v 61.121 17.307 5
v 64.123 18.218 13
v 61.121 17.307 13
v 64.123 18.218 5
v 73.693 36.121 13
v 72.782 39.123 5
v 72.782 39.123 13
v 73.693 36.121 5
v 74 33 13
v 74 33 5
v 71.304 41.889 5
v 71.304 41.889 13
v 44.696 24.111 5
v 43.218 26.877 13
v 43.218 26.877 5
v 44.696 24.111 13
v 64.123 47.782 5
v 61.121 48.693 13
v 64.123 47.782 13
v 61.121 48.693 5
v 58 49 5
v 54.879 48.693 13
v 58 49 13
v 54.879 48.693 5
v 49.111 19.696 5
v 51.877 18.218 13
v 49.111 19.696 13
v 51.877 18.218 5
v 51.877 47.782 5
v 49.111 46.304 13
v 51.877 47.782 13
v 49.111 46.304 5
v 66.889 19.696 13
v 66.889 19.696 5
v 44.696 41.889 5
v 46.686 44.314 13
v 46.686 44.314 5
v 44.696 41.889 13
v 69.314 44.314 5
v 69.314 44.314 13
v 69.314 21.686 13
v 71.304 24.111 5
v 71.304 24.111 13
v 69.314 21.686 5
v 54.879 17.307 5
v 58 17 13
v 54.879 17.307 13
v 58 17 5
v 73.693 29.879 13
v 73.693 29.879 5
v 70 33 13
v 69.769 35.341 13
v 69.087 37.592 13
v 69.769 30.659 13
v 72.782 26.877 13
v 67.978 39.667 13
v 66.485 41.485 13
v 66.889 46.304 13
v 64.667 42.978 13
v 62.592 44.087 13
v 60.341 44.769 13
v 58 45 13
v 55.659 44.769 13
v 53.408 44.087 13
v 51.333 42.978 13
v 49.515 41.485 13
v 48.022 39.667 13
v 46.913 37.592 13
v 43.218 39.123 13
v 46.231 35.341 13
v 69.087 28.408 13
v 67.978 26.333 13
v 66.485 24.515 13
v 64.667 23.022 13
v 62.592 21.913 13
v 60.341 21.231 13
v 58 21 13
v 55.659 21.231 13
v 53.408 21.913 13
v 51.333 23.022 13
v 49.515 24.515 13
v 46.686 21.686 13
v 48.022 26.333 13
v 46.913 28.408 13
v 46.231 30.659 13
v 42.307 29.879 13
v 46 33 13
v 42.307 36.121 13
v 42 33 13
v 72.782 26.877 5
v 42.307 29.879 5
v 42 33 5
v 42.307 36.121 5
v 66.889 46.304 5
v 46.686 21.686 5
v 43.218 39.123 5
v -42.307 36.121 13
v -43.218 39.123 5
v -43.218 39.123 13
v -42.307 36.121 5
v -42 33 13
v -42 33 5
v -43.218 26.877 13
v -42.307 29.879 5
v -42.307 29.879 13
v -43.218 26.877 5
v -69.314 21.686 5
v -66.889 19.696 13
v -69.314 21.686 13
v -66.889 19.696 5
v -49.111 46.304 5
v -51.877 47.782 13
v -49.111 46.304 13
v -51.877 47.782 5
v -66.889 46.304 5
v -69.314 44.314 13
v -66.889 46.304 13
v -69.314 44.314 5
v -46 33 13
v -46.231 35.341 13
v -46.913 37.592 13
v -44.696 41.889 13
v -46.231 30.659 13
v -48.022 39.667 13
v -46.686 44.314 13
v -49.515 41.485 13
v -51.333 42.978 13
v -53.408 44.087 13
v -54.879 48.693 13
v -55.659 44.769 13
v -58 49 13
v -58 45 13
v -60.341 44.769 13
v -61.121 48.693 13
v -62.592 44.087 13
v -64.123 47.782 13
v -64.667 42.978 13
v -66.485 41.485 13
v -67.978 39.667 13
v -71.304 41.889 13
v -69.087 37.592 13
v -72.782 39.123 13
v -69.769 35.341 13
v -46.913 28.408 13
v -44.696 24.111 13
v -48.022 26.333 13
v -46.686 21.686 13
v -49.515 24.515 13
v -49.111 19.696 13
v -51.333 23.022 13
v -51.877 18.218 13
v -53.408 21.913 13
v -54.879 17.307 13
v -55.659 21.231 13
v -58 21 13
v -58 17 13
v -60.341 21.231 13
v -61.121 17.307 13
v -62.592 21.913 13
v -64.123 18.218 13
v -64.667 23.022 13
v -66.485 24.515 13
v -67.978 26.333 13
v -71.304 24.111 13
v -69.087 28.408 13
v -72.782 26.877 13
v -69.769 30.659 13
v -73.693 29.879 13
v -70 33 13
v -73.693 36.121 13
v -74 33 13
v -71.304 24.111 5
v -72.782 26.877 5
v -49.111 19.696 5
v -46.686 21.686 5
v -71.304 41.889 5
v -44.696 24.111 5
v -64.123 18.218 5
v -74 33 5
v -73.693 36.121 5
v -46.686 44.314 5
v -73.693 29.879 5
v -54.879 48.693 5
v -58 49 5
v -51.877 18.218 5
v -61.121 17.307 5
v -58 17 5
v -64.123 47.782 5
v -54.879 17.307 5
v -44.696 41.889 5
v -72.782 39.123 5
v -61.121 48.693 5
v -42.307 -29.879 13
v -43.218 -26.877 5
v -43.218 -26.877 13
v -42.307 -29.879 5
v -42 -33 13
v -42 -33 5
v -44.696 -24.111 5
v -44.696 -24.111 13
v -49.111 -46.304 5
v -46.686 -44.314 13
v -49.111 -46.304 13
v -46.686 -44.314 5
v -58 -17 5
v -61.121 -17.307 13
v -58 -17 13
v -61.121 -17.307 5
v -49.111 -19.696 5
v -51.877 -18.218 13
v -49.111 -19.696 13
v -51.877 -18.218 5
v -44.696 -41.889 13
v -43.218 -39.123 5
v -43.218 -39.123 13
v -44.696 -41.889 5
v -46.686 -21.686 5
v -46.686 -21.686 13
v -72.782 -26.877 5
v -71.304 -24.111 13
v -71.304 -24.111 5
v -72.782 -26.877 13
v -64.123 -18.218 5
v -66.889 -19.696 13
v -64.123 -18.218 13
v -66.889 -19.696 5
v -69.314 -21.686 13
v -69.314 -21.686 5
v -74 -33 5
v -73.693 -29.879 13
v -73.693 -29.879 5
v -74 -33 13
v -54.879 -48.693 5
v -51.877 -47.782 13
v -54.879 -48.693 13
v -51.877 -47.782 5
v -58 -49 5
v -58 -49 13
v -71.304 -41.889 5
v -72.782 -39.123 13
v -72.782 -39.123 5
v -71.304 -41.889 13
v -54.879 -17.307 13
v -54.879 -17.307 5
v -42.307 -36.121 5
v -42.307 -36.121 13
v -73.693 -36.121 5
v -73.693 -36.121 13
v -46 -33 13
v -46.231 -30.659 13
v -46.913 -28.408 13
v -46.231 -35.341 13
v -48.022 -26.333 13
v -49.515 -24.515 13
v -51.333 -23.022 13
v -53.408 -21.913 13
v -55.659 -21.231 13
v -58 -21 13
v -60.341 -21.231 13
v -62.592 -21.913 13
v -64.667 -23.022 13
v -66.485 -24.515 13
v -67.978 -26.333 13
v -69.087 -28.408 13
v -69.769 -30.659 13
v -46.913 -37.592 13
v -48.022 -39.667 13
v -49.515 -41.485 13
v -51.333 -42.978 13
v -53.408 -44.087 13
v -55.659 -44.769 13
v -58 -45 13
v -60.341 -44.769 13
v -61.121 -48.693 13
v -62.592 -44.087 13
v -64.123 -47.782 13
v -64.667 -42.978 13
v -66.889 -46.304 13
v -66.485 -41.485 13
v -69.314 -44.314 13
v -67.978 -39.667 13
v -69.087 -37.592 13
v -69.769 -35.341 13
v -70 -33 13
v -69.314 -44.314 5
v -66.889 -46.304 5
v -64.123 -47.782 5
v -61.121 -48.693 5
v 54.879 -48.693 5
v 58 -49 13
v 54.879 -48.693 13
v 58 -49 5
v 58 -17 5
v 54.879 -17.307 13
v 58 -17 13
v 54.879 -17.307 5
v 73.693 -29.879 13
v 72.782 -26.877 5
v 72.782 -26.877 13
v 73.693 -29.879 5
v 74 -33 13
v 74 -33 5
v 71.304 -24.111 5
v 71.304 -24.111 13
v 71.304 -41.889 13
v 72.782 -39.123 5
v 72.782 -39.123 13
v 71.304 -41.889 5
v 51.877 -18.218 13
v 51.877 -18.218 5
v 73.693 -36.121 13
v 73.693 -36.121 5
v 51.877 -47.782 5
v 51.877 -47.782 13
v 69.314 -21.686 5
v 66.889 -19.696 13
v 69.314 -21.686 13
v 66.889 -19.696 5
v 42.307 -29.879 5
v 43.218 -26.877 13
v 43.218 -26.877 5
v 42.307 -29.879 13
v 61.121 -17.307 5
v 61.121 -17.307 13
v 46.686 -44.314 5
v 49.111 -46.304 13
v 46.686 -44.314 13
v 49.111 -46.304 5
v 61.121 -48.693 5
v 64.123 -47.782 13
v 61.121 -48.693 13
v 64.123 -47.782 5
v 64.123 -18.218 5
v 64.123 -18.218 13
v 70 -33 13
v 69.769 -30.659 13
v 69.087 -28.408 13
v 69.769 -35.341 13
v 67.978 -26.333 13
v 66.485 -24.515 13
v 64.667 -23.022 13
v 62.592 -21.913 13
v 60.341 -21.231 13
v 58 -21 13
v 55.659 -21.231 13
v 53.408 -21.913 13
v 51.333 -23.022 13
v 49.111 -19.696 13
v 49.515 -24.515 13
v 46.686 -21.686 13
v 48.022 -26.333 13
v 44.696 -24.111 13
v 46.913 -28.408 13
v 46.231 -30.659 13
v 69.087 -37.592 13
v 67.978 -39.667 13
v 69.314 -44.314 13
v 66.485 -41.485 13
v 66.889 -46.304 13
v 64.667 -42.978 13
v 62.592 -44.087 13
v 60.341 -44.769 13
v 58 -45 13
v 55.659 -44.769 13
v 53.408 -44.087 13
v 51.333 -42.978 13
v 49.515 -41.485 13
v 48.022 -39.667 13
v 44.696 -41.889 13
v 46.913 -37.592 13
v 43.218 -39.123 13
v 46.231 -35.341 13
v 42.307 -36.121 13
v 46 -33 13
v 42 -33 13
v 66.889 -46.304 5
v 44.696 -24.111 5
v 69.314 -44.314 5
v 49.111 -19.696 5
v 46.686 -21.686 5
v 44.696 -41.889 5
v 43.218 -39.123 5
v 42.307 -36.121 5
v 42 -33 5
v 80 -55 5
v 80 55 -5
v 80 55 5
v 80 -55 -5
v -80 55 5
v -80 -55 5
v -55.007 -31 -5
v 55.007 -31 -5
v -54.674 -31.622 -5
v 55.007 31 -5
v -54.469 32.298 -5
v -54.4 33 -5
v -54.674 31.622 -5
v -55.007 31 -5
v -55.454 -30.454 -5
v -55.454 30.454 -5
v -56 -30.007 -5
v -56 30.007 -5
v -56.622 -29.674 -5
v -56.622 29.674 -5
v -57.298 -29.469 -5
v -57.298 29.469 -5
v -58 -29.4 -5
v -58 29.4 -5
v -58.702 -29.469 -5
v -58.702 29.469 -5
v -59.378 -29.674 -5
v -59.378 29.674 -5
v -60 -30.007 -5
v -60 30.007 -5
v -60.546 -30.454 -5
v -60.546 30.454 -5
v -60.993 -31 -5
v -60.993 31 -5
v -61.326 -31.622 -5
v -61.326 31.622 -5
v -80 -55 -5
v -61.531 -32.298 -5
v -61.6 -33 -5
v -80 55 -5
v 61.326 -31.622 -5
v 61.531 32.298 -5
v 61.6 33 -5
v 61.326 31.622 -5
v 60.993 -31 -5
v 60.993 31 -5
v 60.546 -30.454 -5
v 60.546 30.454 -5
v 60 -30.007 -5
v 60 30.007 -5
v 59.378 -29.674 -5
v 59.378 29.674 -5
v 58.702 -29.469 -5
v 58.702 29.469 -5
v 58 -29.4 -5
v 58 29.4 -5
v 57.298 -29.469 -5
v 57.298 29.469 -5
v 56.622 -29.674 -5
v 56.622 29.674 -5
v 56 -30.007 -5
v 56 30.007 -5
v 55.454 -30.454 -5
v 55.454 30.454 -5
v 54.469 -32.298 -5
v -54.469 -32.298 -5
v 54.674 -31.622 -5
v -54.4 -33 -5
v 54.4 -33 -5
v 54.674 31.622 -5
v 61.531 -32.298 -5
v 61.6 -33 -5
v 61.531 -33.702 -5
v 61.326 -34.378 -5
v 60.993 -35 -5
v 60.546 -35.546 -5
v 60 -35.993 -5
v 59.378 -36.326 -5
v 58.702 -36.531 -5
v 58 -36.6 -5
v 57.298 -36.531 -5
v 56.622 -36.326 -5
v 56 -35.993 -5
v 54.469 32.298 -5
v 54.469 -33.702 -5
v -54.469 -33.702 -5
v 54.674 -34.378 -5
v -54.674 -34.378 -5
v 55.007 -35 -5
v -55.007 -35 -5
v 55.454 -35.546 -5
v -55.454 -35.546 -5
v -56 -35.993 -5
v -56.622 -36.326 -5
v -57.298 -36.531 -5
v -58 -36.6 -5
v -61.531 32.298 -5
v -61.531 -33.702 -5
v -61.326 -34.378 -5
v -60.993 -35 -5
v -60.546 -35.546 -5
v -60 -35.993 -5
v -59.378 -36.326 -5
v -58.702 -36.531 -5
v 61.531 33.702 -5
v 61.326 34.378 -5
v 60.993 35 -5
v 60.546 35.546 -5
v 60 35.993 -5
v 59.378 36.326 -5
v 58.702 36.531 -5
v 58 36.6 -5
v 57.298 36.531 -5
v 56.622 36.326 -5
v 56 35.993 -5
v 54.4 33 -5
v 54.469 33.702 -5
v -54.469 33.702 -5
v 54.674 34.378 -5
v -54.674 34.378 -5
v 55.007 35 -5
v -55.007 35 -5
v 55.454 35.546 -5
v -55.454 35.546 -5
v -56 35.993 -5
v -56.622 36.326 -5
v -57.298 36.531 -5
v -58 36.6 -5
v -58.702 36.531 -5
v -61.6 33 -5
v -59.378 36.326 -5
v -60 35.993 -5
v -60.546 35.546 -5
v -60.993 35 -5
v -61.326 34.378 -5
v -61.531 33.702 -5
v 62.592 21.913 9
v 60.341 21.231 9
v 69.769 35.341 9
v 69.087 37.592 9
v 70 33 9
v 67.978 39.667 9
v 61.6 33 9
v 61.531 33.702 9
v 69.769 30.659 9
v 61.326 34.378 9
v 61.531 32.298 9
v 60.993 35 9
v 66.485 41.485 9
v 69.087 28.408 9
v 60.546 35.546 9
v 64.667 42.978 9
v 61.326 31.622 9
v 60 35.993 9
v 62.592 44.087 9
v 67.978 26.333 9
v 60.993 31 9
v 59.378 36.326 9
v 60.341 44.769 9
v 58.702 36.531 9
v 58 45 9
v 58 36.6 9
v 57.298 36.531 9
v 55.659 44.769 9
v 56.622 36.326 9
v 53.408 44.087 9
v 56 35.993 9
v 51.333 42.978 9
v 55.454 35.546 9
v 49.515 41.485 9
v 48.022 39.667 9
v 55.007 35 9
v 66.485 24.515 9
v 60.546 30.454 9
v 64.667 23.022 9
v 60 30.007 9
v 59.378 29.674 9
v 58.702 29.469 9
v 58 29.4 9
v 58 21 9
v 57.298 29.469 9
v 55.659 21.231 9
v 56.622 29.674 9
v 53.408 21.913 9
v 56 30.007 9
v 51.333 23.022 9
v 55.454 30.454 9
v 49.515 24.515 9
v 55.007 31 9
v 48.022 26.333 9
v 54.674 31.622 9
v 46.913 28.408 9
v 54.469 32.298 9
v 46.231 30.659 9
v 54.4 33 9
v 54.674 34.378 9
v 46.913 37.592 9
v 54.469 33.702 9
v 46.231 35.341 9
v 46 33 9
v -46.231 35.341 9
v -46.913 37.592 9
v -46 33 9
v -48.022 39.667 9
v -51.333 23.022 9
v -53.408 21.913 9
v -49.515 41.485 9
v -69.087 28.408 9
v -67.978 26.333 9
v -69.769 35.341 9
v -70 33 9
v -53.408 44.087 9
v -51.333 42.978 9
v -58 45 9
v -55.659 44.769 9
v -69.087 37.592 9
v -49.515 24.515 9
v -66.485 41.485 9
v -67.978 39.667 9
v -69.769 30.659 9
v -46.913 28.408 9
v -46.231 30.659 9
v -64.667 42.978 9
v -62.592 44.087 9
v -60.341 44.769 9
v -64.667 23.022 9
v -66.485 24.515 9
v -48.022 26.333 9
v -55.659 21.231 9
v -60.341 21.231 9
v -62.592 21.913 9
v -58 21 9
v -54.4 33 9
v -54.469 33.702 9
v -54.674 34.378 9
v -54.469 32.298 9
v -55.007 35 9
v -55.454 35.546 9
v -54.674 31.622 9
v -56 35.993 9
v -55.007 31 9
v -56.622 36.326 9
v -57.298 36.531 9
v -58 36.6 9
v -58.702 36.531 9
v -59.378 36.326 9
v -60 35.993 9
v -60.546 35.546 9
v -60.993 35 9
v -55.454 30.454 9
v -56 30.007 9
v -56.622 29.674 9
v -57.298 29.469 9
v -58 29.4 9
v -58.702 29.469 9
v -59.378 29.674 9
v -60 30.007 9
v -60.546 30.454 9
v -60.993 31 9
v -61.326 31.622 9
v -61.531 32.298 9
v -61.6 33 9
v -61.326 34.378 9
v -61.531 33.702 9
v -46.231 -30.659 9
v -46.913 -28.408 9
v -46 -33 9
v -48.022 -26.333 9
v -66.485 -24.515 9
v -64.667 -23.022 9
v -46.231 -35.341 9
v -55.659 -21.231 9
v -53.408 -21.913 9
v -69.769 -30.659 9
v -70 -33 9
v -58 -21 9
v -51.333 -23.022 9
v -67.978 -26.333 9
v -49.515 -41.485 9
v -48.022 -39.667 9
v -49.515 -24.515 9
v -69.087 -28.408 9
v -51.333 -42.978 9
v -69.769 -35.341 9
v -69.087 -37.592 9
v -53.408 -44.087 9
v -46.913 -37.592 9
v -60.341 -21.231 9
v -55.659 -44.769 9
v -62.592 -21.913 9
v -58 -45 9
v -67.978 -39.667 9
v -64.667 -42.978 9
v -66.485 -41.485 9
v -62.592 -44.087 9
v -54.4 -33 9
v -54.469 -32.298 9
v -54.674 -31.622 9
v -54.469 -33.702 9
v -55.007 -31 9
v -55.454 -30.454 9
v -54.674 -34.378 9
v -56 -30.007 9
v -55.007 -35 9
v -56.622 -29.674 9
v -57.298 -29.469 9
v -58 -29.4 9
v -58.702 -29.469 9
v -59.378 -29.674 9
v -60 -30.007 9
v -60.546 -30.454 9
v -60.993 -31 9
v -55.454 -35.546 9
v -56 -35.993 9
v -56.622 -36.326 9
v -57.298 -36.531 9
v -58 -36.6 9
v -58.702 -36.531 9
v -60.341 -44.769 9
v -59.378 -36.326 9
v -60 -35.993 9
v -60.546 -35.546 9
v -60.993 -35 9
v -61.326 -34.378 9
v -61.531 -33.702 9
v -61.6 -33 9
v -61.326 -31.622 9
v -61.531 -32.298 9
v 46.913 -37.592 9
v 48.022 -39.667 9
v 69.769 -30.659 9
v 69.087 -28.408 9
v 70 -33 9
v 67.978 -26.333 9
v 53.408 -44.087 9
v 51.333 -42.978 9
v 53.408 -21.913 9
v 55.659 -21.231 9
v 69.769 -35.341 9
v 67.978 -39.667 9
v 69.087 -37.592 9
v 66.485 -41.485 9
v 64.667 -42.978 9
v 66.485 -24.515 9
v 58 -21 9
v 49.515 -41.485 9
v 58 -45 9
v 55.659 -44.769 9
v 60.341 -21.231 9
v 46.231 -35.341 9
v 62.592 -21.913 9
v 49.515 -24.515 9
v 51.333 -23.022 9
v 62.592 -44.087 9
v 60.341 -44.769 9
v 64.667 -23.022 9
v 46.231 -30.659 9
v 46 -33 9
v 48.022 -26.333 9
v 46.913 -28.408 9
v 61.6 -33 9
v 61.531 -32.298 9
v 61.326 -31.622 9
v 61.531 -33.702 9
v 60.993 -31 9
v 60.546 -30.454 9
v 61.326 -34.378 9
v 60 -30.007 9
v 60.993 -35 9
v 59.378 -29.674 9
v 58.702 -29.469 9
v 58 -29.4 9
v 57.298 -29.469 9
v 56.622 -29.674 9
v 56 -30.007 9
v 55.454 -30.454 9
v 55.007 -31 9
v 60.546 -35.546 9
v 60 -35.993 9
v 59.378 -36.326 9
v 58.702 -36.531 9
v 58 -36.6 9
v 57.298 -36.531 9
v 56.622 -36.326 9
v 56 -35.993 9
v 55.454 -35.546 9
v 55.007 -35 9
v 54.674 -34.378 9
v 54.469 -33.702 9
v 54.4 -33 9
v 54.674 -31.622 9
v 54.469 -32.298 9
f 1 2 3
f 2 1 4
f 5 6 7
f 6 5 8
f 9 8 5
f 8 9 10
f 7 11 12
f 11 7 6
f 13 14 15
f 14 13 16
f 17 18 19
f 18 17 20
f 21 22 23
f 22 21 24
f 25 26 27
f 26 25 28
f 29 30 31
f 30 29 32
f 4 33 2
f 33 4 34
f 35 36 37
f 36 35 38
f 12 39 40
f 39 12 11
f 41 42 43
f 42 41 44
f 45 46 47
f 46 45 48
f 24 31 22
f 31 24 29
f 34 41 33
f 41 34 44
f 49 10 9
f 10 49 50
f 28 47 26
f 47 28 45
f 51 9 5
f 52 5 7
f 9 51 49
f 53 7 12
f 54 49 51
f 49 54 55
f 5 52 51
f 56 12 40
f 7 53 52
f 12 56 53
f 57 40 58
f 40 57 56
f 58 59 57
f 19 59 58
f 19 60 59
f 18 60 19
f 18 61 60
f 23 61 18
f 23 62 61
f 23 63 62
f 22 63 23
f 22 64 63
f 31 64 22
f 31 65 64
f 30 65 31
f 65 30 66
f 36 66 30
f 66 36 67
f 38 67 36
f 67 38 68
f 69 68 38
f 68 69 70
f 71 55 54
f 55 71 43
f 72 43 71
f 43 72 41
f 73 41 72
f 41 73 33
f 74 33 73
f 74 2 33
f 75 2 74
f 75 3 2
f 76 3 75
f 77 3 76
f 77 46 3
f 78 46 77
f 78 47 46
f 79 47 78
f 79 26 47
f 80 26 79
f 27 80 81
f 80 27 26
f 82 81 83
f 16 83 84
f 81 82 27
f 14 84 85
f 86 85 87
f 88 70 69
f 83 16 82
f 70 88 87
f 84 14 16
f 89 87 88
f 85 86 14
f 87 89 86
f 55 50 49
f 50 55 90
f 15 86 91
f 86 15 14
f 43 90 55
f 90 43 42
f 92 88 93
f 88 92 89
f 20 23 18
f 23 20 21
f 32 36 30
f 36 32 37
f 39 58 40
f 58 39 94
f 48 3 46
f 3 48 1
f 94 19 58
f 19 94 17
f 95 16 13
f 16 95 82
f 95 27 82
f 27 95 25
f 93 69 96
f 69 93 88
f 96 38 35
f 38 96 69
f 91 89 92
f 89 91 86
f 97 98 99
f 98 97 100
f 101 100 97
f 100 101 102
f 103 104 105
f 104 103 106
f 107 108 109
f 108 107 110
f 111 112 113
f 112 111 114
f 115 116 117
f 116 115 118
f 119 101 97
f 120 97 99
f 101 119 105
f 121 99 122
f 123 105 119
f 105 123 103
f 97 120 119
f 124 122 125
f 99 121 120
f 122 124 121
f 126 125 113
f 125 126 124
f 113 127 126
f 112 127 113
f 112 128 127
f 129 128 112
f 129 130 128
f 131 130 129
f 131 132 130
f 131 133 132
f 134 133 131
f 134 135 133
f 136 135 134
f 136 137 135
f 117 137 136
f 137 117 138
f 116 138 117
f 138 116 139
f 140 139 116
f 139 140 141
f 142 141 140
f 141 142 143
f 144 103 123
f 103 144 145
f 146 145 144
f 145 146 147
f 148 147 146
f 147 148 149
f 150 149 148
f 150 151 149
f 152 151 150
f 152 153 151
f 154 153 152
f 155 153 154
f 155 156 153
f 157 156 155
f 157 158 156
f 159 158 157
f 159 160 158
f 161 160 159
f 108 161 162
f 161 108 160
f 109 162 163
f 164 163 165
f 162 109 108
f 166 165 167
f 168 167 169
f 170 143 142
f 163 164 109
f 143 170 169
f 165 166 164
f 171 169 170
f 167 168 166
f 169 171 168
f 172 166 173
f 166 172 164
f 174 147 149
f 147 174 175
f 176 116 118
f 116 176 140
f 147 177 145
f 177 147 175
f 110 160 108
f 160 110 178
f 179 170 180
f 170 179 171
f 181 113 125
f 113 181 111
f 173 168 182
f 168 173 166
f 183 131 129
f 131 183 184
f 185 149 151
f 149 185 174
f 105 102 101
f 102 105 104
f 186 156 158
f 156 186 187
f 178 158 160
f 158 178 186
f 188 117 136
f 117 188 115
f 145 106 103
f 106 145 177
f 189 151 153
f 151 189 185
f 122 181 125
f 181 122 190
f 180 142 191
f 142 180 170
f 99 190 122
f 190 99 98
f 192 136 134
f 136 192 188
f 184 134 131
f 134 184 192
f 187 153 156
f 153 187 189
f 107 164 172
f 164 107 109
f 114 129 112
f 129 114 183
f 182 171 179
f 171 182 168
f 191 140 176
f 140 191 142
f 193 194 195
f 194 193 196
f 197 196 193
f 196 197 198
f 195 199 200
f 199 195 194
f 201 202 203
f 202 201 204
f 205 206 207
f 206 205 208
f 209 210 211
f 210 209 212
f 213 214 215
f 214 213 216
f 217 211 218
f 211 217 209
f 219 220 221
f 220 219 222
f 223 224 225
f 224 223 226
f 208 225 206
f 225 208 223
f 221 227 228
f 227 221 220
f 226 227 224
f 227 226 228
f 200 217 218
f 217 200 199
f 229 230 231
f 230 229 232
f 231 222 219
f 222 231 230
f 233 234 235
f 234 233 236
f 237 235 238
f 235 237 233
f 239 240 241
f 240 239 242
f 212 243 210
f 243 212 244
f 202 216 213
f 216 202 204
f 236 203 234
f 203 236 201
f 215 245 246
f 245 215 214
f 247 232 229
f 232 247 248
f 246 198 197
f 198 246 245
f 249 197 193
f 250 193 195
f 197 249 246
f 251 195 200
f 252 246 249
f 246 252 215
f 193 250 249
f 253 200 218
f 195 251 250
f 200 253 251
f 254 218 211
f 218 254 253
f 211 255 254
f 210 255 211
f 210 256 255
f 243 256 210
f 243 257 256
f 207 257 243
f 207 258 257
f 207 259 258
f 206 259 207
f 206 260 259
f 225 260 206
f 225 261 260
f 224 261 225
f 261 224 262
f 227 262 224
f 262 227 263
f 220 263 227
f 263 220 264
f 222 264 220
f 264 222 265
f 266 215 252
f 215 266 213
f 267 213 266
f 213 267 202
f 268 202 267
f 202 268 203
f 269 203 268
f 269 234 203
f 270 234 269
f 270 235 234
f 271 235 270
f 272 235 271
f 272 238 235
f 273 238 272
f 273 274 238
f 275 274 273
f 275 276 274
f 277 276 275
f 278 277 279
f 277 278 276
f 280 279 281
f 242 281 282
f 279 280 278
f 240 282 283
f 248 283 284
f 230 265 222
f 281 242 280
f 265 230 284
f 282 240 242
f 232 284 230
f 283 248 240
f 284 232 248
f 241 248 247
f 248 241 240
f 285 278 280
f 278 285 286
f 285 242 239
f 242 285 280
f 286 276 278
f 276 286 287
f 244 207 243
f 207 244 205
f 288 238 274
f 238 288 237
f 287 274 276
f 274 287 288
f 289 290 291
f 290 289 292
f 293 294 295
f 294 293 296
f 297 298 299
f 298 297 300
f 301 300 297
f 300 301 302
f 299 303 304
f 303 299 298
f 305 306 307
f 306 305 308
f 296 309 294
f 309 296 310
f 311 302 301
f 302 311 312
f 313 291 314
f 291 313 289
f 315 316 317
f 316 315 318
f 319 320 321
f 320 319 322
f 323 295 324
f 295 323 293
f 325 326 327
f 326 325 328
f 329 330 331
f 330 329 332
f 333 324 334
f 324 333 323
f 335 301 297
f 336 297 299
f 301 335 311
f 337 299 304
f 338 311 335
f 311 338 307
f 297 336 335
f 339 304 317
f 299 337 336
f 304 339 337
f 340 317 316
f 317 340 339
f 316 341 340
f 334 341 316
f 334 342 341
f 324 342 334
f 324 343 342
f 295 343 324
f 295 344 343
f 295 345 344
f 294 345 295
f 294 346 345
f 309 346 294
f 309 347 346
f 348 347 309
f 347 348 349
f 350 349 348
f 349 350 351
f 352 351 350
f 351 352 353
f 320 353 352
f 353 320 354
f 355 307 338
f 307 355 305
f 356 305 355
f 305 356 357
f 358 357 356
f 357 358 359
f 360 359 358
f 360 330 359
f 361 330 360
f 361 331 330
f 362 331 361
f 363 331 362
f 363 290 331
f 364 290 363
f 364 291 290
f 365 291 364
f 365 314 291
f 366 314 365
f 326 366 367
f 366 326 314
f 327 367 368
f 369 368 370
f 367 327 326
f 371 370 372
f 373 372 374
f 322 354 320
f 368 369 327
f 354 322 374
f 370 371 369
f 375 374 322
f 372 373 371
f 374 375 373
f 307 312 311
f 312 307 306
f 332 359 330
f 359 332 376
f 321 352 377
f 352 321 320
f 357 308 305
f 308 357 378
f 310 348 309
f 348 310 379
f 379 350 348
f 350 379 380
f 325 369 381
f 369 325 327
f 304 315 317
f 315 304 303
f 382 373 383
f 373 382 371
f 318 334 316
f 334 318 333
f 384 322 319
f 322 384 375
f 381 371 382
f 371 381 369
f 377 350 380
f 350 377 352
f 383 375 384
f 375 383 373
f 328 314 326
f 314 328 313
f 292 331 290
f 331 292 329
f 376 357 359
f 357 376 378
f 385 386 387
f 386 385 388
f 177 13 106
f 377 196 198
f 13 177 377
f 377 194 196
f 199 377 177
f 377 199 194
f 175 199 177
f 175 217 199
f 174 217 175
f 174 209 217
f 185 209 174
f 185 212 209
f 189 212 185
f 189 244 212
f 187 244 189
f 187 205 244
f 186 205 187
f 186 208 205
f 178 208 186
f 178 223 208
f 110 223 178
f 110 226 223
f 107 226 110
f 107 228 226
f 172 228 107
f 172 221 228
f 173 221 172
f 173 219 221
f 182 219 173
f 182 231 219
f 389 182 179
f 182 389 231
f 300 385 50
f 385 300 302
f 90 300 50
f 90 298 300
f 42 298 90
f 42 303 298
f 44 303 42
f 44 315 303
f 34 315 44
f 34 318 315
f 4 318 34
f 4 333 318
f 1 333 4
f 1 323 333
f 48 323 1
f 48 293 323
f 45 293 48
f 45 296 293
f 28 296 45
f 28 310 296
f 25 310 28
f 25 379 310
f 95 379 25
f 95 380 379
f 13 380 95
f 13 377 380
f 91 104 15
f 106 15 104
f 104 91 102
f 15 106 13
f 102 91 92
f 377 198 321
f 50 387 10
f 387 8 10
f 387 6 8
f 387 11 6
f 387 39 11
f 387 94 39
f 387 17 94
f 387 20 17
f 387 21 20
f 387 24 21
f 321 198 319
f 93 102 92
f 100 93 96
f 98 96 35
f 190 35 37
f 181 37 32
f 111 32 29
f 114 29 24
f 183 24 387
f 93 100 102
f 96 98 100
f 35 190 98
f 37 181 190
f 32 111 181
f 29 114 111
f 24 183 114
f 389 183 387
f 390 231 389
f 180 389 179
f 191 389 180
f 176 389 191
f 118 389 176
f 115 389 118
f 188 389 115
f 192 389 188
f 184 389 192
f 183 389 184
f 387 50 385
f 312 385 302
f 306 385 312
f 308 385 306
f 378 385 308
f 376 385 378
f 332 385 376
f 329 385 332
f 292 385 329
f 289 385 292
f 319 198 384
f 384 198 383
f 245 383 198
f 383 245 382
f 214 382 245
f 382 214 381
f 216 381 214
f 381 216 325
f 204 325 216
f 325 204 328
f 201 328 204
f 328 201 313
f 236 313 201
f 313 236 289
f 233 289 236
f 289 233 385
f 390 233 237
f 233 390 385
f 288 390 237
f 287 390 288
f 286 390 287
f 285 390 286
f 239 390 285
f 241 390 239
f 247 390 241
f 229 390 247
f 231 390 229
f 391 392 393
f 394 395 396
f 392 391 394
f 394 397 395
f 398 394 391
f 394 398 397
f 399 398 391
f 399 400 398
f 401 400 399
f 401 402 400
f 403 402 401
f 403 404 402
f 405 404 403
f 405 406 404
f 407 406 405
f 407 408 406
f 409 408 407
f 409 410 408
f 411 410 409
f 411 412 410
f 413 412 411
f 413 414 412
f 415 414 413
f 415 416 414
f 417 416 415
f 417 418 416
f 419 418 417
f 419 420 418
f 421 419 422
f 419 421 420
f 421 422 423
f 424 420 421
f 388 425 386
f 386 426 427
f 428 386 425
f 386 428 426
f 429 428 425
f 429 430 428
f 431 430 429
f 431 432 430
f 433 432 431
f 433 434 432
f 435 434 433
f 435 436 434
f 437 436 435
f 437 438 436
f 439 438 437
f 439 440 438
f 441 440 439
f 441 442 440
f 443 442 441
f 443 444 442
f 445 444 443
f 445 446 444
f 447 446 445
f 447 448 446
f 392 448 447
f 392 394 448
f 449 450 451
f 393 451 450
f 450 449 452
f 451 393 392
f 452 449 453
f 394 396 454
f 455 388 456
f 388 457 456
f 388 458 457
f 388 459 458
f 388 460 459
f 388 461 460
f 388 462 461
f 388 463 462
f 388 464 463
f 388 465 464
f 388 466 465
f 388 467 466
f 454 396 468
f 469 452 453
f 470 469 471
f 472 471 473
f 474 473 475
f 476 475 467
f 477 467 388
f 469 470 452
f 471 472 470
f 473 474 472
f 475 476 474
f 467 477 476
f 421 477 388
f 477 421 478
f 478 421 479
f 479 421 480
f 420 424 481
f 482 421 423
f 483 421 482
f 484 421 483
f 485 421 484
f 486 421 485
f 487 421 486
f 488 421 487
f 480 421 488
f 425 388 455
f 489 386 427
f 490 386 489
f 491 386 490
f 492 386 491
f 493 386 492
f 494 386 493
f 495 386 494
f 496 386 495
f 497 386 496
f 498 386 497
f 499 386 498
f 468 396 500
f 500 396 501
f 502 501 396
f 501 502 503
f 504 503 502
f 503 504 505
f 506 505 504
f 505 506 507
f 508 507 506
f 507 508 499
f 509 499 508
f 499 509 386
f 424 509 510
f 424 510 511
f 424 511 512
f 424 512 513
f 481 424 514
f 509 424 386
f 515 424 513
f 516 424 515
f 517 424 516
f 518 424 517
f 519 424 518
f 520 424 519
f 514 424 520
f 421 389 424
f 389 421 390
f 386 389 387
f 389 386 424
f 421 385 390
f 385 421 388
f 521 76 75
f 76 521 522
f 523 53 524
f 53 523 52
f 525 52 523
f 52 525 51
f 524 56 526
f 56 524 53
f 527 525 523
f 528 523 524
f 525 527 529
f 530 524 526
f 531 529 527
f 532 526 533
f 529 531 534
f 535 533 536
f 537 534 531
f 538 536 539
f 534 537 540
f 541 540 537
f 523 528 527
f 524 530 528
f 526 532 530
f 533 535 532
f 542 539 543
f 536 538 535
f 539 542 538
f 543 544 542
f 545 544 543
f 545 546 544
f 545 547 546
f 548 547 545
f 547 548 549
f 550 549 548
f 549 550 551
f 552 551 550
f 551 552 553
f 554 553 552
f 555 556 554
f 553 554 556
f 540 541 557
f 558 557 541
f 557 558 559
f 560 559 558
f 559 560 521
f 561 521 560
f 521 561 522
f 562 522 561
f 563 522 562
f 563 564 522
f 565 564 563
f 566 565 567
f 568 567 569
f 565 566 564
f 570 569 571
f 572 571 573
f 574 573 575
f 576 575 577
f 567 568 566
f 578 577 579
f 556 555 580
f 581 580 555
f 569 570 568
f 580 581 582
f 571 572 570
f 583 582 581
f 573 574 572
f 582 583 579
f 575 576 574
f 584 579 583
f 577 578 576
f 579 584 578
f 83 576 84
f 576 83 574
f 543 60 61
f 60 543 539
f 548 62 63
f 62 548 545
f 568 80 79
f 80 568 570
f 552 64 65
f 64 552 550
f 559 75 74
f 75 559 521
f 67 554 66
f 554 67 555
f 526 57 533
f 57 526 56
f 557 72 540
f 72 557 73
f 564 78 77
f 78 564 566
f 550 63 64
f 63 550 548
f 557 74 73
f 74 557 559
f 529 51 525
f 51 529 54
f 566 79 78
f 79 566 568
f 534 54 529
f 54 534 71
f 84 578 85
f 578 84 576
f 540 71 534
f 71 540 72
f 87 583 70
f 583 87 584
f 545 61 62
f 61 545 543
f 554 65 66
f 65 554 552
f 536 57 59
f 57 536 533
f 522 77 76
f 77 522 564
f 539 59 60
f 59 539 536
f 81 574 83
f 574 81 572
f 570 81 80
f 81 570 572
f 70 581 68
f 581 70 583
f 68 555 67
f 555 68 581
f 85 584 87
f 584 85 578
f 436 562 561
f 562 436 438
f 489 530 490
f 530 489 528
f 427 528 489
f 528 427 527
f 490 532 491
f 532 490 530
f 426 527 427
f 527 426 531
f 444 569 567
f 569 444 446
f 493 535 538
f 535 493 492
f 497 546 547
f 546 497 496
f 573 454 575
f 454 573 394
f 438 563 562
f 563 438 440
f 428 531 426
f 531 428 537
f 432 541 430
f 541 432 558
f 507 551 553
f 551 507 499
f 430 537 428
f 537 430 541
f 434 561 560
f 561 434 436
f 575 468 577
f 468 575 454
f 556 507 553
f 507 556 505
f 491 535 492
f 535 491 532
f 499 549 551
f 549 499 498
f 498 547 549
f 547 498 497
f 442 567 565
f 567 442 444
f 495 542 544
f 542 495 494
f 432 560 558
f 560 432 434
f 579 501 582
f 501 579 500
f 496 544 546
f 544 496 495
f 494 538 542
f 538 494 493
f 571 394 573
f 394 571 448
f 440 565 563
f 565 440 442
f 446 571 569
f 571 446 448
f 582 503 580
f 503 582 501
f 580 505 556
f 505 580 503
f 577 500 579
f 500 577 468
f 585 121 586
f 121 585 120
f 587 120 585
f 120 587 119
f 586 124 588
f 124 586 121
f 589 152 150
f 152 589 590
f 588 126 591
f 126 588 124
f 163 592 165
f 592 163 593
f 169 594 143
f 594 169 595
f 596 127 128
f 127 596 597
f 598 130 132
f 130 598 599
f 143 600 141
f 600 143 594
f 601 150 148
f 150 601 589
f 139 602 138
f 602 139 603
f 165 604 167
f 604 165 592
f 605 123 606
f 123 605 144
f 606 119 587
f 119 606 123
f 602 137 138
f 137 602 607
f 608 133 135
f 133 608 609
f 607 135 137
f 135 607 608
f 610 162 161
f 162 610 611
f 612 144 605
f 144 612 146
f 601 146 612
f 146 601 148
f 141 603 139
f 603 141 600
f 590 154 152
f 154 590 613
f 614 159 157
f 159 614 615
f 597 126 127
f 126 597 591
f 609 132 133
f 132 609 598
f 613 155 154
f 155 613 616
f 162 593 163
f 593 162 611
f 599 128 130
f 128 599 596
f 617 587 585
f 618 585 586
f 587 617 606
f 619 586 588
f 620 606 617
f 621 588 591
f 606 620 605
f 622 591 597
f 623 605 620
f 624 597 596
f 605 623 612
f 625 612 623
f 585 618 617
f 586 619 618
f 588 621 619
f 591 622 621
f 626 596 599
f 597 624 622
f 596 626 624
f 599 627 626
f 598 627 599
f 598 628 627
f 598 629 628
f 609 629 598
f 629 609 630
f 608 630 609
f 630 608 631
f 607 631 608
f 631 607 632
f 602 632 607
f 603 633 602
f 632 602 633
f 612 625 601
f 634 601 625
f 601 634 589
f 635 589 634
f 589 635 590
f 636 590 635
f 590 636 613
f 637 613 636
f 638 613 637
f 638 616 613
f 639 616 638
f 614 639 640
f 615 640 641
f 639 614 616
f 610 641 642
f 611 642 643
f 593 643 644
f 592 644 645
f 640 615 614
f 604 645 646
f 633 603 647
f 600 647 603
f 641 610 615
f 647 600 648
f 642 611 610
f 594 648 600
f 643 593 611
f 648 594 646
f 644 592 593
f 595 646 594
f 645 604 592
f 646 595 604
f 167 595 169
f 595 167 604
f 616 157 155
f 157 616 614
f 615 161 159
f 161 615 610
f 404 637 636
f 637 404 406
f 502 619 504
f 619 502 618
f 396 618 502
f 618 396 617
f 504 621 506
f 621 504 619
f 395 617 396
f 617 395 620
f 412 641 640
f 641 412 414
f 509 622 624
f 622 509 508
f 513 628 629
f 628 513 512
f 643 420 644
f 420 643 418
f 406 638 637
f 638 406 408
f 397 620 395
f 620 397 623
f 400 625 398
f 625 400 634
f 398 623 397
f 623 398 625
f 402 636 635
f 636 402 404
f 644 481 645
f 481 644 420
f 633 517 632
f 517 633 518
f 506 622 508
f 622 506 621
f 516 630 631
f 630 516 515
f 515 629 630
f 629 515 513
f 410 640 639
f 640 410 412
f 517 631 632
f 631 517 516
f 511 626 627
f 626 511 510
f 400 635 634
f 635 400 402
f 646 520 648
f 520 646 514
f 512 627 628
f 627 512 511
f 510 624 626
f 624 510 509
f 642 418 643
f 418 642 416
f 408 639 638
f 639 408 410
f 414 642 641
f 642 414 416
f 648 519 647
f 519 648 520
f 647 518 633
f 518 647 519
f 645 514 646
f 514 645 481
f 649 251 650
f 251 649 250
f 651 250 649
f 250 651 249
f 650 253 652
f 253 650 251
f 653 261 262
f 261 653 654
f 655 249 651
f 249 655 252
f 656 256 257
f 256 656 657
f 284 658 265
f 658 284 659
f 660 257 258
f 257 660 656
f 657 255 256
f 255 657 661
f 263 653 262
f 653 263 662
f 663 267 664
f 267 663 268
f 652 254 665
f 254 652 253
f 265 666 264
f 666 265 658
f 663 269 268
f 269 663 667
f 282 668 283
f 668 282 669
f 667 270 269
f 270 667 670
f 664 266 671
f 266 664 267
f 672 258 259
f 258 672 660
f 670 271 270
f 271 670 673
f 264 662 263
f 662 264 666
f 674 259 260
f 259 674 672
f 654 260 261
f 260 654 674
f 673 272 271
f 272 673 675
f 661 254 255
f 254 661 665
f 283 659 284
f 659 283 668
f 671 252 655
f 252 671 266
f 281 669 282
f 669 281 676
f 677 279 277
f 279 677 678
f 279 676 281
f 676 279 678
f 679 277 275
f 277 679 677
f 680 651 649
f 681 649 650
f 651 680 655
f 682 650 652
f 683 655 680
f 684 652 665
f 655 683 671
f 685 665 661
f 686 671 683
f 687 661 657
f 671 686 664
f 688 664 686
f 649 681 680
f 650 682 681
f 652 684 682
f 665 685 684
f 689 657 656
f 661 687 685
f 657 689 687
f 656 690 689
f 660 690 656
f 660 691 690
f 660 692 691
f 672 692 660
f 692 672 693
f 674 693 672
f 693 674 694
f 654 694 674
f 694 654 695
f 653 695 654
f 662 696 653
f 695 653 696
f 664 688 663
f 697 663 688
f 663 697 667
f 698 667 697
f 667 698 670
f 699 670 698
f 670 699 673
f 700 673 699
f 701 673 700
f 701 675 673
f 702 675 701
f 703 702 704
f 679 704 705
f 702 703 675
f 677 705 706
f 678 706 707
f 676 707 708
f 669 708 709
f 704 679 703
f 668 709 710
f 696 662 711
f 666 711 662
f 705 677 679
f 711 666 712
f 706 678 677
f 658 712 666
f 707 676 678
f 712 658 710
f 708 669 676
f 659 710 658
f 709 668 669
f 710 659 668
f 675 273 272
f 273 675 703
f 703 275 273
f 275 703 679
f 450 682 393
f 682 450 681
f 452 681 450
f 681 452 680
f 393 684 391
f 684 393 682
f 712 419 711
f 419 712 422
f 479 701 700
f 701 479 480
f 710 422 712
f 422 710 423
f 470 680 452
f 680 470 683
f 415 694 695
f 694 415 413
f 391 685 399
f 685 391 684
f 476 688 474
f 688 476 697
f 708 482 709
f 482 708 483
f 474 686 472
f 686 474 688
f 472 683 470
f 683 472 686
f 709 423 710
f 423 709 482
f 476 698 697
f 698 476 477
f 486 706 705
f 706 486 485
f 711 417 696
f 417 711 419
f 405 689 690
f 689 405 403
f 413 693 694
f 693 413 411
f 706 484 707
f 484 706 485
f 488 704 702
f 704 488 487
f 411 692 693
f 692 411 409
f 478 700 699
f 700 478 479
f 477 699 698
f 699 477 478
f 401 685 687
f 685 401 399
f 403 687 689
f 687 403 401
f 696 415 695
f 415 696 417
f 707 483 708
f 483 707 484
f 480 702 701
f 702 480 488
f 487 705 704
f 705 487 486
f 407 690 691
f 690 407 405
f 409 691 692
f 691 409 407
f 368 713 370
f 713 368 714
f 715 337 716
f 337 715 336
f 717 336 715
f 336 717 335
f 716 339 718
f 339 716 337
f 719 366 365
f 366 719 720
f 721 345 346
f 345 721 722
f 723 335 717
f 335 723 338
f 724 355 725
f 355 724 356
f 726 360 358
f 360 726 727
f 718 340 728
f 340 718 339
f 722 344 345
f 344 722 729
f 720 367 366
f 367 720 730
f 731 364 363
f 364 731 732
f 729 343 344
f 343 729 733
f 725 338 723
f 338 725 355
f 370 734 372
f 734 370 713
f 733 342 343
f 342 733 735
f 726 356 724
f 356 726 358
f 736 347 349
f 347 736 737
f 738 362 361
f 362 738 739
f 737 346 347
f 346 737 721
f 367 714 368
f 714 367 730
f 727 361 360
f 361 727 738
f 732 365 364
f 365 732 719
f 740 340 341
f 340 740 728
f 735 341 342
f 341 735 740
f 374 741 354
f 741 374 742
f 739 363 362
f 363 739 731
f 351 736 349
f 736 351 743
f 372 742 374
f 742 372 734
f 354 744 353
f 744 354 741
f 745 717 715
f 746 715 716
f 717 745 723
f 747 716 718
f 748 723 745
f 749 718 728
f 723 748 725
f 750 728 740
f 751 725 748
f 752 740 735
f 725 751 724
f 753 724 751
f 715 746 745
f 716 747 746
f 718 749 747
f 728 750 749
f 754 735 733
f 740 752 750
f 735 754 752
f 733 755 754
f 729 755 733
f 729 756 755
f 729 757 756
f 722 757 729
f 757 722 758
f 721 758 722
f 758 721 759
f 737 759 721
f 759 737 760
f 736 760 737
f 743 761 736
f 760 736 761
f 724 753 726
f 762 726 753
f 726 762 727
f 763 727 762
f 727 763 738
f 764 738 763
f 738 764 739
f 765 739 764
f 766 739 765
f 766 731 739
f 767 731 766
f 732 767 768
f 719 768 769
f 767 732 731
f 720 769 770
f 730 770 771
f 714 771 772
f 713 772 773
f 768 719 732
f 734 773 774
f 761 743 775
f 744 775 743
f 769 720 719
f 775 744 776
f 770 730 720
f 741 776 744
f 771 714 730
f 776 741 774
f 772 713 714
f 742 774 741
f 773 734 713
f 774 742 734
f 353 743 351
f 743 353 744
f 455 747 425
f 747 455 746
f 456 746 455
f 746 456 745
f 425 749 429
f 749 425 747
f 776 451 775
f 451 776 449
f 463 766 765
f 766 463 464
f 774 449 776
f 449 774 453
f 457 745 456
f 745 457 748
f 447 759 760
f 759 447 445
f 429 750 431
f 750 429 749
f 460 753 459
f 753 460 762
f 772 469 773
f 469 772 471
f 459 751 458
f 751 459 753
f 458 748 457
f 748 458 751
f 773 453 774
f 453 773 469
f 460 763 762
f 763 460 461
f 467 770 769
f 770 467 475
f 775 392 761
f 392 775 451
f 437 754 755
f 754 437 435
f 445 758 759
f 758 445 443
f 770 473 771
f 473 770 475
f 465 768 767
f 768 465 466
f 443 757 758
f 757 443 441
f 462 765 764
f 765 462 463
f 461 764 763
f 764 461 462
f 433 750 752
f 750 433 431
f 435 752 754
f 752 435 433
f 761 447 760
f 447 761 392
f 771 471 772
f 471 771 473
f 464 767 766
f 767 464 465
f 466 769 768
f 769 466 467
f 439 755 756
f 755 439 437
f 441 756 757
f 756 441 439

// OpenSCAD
$fn = 32;

// ----------------------------------------------------------------------
// Socket pad plate
// bosses with counterbored sockets for the screws
// ----------------------------------------------------------------------

// --- parameters (mm) ---
base_t = 10;             // base plate thickness
boss_h = 8;              // boss height above the base plate
boss_d = 32;             // boss diameter
socket_d = 24;           // socket diameter
socket_depth = 4;        // socket depth from the boss face
bolt_d = 7.2;            // screw clearance hole through the socket floor
plate = [160, 110, 10];  // overall size (x, y, z)
edge = 22;               // boss centre offset from the plate edge
pads = 4;                // boss count, one per corner

// --- derived feature positions (mm) ---
height = base_t + boss_h;        // = 18   overall height of the part
corner_x = plate[0] / 2 - edge;  // = 58   boss centre X
corner_y = plate[1] / 2 - edge;  // = 33   boss centre Y
feature_centers = [
  [corner_x, corner_y],
  [-corner_x, corner_y],
  [-corner_x, -corner_y],
  [corner_x, -corner_y]
];   // boss centres: sockets, holes and the pads themselves are placed from here

// base plate, bosses on feature_centers, socket + through hole in each
difference() {
  union() {
    cube(plate, center = true);
    for (centre = feature_centers)
      translate([centre[0], centre[1], plate[2] / 2 - 1])
        cylinder(d = boss_d, h = boss_h + 1);
  }
  for (centre = feature_centers) {
    translate([centre[0], centre[1], plate[2] / 2 + boss_h - socket_depth])
      cylinder(d = socket_d, h = socket_depth + 1);
    translate([centre[0], centre[1], -height])
      cylinder(d = bolt_d, h = 2 * height + 2);  // through the socket floor
  }
}
